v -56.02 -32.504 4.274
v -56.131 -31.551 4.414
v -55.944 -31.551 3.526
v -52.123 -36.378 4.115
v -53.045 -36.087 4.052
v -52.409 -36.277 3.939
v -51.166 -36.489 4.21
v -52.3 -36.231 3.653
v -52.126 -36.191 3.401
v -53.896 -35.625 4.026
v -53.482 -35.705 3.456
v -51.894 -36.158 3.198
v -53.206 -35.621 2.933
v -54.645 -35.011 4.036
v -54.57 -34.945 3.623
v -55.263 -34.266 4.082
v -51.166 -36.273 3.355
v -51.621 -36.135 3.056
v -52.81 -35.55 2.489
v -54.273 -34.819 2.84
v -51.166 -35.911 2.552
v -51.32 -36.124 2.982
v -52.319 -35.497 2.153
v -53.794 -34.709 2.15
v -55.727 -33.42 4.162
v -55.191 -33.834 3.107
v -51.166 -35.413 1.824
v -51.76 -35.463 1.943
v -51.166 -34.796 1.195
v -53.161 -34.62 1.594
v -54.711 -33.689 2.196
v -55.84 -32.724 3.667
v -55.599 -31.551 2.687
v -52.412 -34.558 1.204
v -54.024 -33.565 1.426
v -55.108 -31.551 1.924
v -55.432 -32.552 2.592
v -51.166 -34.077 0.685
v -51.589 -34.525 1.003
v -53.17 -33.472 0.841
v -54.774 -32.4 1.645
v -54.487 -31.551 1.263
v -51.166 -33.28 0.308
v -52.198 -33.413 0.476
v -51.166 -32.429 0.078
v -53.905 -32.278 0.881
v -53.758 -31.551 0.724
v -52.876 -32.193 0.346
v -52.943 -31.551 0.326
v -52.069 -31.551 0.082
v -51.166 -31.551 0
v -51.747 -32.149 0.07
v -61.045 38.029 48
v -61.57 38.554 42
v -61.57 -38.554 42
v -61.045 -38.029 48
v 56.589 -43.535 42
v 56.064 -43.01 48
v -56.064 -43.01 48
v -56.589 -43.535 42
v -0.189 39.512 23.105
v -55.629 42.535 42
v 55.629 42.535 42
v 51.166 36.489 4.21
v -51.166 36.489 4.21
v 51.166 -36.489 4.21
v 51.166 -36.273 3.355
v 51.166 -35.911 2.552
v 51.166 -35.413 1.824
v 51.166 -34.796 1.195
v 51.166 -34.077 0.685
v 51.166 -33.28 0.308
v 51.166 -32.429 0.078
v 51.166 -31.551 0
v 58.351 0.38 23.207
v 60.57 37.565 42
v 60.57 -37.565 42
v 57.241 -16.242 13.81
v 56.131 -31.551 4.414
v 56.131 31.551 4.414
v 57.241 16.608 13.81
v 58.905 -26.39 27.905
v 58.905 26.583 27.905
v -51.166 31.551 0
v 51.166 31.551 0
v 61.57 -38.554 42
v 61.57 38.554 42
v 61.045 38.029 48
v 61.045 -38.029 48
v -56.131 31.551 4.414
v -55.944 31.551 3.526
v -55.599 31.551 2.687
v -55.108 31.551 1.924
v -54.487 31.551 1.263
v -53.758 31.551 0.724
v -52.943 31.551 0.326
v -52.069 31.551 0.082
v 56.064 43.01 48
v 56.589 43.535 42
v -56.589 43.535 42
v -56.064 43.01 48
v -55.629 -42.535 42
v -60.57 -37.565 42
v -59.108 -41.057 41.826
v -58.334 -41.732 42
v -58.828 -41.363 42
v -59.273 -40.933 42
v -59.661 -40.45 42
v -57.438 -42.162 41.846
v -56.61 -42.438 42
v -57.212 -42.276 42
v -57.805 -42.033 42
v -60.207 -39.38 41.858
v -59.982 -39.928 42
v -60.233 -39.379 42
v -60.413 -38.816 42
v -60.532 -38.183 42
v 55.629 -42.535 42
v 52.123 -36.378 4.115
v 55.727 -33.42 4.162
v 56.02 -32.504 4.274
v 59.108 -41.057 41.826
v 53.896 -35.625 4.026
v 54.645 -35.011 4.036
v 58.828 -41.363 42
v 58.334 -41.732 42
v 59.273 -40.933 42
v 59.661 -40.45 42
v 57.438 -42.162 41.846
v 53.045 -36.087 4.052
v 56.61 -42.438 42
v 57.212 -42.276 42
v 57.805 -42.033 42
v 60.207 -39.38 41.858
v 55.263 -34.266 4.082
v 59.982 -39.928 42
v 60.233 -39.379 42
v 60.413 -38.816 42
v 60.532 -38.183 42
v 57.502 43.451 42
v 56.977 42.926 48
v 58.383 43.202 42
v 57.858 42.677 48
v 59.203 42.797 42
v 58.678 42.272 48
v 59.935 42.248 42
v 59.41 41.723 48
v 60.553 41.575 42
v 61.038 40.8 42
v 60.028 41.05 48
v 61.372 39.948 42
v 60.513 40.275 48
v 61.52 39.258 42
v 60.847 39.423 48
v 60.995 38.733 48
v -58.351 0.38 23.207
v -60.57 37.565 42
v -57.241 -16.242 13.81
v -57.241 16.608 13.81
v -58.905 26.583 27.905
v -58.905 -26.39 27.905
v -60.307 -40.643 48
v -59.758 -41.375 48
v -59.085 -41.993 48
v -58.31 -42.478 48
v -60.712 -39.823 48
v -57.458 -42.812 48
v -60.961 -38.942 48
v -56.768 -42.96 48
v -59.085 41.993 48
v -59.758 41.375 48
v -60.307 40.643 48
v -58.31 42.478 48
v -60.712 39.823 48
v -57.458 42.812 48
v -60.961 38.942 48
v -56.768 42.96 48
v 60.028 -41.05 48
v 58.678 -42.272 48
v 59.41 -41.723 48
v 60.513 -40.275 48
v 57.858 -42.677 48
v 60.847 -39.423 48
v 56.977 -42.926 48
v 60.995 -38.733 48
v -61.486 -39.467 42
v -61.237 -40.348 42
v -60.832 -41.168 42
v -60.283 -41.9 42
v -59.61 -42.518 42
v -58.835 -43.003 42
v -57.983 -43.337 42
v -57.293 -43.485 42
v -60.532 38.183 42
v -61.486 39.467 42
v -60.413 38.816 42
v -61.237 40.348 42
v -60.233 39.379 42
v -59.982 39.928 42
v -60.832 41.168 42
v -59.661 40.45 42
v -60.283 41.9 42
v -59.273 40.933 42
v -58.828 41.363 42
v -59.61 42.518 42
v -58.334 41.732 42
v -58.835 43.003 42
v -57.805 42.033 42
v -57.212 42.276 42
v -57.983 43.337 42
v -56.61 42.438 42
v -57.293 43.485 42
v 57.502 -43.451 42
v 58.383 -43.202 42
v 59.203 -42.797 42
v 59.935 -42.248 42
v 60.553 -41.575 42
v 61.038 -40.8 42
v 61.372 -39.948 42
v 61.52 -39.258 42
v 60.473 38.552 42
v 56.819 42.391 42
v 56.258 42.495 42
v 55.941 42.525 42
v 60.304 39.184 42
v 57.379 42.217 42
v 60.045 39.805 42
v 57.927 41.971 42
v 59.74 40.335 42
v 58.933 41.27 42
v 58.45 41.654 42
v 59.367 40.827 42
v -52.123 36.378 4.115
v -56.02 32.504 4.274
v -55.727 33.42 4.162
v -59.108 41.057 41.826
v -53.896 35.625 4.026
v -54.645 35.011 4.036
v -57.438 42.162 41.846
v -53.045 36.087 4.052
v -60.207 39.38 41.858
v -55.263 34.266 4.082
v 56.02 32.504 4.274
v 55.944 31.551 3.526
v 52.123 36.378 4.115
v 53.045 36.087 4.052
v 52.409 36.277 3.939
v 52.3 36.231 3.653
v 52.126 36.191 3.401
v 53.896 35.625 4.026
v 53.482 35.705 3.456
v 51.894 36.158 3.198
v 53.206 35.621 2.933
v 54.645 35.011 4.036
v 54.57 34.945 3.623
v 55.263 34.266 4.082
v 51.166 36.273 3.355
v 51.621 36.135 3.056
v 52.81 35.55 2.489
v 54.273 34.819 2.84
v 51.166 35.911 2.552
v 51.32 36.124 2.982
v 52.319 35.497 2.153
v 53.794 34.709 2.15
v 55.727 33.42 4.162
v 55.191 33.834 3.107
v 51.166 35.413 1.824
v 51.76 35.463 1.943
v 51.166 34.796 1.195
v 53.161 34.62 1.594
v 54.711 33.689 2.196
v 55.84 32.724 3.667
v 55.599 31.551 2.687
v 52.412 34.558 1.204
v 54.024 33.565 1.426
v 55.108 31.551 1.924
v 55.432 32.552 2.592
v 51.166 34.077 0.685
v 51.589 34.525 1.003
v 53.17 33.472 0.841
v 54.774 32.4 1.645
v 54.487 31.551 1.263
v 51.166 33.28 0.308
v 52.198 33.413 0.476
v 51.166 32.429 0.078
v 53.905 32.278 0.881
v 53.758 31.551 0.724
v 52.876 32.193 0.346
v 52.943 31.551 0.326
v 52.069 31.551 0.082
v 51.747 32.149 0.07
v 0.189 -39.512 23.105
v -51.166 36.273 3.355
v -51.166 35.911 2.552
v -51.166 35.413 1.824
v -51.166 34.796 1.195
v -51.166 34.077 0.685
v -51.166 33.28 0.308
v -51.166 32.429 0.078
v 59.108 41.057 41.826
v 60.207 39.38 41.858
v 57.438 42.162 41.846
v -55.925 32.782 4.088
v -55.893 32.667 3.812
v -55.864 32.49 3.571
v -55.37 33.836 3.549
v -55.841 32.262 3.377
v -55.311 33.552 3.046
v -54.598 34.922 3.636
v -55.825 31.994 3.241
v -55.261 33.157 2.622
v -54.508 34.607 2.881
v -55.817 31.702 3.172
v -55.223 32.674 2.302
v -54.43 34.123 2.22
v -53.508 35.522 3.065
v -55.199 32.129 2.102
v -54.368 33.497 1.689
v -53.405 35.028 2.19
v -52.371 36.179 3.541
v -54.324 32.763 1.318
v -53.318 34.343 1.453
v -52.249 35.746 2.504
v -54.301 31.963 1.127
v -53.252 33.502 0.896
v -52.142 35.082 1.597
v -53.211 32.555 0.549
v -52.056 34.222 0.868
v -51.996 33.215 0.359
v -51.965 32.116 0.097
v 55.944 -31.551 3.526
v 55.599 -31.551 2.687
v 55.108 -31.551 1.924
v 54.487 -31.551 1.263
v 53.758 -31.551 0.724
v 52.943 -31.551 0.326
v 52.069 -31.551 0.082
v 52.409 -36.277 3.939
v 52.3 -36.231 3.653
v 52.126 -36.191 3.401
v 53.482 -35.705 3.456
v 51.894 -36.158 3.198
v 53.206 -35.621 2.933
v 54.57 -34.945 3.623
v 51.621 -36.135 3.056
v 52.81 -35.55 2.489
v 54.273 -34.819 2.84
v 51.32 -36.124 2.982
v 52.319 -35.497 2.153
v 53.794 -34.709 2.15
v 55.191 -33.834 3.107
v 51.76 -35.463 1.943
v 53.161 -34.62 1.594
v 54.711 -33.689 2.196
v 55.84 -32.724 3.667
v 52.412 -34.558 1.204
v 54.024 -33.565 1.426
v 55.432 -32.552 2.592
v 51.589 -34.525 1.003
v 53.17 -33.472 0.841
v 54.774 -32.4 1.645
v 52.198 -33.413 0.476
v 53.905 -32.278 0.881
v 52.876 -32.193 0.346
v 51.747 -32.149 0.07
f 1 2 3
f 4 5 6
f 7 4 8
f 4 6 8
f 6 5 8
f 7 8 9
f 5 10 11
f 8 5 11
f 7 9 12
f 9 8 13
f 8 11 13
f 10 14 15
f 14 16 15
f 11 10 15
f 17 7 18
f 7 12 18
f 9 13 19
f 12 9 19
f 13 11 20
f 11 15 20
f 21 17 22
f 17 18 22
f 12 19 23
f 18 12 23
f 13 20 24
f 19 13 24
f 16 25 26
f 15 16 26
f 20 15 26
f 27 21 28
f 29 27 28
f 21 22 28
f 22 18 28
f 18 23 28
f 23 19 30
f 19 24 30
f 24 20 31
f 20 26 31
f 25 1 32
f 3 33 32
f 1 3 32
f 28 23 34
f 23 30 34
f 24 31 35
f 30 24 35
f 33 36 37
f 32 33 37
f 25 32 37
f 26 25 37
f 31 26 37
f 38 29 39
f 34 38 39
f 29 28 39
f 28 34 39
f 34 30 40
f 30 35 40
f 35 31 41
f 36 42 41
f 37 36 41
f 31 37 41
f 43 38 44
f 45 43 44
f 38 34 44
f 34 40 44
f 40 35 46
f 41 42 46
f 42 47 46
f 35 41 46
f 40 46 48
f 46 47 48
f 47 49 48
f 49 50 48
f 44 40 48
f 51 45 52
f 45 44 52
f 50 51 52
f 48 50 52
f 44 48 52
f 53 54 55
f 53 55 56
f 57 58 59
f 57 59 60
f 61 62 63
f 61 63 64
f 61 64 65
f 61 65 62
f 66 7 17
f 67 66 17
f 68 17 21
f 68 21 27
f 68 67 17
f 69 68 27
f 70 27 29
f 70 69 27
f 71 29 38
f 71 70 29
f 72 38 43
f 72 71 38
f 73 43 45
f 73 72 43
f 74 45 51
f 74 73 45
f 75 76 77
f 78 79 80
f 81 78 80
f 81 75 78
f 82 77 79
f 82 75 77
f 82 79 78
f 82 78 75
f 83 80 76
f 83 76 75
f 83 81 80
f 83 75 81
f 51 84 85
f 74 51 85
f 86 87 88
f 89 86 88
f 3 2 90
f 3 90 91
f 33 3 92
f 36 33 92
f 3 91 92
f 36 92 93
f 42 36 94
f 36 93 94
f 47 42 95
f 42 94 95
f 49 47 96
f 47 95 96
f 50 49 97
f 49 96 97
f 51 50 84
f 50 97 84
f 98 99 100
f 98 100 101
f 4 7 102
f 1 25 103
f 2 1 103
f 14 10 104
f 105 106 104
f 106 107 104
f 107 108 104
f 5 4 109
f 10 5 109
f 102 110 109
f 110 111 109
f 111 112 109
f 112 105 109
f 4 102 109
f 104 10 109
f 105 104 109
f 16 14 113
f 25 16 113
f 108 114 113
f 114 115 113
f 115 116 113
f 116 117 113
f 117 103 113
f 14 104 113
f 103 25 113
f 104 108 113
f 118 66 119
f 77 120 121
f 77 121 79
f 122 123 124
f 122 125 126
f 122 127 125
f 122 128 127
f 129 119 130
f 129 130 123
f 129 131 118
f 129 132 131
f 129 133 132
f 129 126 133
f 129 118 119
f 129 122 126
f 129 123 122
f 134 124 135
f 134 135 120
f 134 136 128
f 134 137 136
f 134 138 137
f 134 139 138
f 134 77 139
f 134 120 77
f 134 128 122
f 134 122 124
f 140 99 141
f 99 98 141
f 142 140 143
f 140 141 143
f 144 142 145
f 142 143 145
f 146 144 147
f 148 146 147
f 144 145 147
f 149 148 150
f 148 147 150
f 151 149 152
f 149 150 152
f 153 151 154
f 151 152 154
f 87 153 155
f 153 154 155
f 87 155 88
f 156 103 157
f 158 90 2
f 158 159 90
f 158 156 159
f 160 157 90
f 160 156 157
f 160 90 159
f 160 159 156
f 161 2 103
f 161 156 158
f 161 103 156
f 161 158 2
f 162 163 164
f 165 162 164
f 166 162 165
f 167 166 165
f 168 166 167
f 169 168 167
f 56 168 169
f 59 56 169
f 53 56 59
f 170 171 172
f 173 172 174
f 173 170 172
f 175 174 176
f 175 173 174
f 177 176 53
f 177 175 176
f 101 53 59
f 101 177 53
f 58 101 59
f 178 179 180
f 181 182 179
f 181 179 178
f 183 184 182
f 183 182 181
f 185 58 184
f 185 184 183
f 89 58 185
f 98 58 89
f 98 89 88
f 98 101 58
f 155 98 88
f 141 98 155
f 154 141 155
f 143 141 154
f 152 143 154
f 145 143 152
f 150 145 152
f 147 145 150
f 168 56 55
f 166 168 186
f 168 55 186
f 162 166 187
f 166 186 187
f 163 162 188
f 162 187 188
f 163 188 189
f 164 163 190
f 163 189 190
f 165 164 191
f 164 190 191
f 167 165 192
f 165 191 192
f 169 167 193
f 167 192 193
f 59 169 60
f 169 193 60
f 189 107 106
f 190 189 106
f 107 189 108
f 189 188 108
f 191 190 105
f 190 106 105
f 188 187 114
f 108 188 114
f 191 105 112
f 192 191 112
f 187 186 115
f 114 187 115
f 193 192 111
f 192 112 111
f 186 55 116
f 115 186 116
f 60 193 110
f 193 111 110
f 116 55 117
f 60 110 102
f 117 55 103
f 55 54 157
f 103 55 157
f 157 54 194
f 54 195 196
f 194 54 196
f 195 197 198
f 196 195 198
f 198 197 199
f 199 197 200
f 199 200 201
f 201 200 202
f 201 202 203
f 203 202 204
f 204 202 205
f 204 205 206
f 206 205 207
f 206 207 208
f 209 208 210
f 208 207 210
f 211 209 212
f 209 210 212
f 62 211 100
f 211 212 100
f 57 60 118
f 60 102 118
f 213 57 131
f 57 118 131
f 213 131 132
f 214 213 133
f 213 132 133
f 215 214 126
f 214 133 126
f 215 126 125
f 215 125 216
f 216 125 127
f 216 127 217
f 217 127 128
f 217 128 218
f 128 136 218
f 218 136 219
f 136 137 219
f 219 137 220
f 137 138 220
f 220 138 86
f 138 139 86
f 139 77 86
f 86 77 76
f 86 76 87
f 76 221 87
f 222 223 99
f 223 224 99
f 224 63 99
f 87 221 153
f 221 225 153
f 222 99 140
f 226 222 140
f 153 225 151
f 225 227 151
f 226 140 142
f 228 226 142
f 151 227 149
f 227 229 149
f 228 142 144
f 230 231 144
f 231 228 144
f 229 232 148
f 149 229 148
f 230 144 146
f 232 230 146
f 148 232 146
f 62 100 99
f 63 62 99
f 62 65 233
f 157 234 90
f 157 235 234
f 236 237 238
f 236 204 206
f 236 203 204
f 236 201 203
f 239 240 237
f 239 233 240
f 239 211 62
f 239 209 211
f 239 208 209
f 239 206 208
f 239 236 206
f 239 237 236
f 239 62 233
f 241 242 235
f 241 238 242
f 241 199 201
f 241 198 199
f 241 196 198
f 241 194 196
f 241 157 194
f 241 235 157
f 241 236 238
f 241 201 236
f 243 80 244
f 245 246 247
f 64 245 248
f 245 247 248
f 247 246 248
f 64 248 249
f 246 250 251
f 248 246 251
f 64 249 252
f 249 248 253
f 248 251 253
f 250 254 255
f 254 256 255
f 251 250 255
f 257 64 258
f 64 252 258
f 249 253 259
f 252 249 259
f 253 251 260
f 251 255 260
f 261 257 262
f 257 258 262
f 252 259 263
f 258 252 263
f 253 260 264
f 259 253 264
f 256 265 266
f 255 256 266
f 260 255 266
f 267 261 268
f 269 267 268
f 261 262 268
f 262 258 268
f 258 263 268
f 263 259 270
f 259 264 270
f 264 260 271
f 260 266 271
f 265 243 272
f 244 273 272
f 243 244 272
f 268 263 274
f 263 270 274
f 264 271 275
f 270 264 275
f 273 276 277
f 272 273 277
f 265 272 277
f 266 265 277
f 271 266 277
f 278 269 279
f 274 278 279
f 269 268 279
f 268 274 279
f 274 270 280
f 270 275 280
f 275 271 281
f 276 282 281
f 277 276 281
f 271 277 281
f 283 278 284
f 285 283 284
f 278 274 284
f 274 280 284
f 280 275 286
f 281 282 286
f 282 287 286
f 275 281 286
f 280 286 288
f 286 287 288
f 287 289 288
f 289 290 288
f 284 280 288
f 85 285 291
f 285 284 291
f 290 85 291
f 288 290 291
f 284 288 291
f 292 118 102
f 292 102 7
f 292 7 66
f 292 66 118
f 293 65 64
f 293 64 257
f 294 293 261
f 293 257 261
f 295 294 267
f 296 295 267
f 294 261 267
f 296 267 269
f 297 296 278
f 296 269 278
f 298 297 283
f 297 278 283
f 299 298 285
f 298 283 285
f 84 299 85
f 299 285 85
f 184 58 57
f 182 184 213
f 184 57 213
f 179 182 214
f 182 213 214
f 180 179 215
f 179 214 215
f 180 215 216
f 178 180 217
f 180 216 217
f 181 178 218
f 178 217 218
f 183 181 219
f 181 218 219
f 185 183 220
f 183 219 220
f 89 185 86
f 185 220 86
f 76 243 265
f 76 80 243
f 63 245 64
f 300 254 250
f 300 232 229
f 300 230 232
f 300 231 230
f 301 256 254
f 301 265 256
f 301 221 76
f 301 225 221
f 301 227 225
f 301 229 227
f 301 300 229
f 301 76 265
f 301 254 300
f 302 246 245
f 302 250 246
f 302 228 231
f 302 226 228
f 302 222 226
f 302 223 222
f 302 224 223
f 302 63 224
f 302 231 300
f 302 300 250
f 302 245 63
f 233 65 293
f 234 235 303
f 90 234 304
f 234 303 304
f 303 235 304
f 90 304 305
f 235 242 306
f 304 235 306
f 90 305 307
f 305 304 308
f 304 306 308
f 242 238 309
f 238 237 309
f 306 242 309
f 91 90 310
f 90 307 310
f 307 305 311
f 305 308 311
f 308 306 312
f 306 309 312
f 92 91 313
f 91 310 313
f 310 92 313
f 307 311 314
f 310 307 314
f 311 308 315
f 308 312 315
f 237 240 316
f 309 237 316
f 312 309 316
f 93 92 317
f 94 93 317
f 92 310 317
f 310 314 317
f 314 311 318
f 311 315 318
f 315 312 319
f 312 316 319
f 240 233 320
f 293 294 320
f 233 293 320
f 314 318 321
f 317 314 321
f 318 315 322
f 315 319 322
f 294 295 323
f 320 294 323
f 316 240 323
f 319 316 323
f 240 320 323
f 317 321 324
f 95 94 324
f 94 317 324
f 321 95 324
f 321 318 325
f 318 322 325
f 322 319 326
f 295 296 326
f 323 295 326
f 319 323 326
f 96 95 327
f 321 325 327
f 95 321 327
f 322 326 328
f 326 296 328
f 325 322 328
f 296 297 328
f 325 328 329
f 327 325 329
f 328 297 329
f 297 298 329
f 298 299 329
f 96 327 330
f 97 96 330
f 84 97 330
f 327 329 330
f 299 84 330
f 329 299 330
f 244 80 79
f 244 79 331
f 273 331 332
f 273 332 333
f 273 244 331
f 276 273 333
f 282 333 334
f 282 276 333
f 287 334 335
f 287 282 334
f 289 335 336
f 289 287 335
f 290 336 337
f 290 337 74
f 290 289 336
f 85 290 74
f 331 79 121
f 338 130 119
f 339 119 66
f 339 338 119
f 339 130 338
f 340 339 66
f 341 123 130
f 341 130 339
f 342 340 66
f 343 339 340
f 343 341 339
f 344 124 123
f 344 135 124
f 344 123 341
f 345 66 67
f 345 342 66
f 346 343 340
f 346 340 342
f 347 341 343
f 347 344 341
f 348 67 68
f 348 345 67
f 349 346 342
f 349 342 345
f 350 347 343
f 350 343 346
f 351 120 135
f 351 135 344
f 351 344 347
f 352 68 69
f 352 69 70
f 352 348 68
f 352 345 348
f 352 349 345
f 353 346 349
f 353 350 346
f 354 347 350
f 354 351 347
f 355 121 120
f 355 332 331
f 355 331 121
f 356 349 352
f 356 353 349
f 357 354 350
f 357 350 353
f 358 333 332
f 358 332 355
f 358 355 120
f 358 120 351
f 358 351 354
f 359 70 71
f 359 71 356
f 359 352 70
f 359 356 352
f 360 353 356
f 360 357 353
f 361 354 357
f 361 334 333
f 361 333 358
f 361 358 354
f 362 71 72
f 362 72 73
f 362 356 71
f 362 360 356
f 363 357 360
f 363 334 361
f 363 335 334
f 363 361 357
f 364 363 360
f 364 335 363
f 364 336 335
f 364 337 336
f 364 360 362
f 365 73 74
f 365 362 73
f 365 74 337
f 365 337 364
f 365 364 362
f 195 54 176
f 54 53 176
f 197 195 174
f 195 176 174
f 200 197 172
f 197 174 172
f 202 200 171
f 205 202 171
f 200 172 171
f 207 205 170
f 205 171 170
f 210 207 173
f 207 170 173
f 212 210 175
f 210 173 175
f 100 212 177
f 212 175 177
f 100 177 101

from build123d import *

# Parameters (mm, degrees)
F0_W        = 111.22
F0_H        = 71.63
F2_W        = 121.14
F2_H        = 85.07
F4_W        = 123.14
F4_H        = 87.07
F5_DEPTH    = 6
F6_T1_DEPTH = 118.265608958
F6_T3_DEPTH = 154.335608958
F9_R        = 5


# Not quite as in the source:
# - a fillet or chamfer that OpenCascade refuses, or shapes differently, is made with other operations: its cross-section is extruded or revolved along the edge and cut away or added
# - a feature of the source that left no trace in its solid (it failed there, or was rolled back) is left out


with BuildPart() as f3:
    # F0 (on Top) → F3 section 0
    with BuildSketch(Plane.XY):
        Rectangle(F0_W, F0_H)
    # F2 (on offset) → F3 section 1
    with BuildSketch(Plane.XY.offset(42)):
        Rectangle(F2_W, F2_H)
    loft()

    # F4 (on face) → F5 (join)
    with BuildSketch(Plane.XY.offset(42)):
        Rectangle(F4_W, F4_H)
    extrude(amount=F5_DEPTH)

    # F6: chamfer of 6 x 0.5249319812 on 4 edges, made by hand

    # F6_s2 → F6_t1 (cut)
    with BuildSketch(Plane.XZ.offset(-59.132804479)):
        Polygon((-61.57, 42), (-61.0450680188, 48), (-61.57, 48), align=None)
        Polygon((61.57, 42), (61.0450680188, 48), (61.57, 48), align=None)
    extrude(amount=F6_T1_DEPTH, mode=Mode.SUBTRACT)

    # F6_s4 → F6_t3 (cut)
    with BuildSketch(Plane.YZ.offset(-77.167804479)):
        Polygon((-43.0100680188, 48), (-43.535, 42), (-43.535, 48), align=None)
        Polygon((43.535, 42), (43.0100680188, 48), (43.535, 48), align=None)
    extrude(amount=F6_T3_DEPTH, mode=Mode.SUBTRACT)

    # F9
    f9_edges = [f3.edges().sort_by_distance(p)[0] for p in [
        (-61.307534, -43.272534, 45),
        (-61.307534, 43.272534, 45),
        (61.307534, 43.272534, 45),
        (61.307534, -43.272534, 45),
        (55.61, 0, 0),
        (58.09, 39.175, 21),
        (58.09, -39.175, 21),
        (0, 35.815, 0),
        (-58.09, 39.175, 21),
        (-55.61, 0, 0),
        (-58.09, -39.175, 21),
        (0, -35.815, 0),
    ]]
    fillet(f9_edges, radius=F9_R)


solid = f3.part
